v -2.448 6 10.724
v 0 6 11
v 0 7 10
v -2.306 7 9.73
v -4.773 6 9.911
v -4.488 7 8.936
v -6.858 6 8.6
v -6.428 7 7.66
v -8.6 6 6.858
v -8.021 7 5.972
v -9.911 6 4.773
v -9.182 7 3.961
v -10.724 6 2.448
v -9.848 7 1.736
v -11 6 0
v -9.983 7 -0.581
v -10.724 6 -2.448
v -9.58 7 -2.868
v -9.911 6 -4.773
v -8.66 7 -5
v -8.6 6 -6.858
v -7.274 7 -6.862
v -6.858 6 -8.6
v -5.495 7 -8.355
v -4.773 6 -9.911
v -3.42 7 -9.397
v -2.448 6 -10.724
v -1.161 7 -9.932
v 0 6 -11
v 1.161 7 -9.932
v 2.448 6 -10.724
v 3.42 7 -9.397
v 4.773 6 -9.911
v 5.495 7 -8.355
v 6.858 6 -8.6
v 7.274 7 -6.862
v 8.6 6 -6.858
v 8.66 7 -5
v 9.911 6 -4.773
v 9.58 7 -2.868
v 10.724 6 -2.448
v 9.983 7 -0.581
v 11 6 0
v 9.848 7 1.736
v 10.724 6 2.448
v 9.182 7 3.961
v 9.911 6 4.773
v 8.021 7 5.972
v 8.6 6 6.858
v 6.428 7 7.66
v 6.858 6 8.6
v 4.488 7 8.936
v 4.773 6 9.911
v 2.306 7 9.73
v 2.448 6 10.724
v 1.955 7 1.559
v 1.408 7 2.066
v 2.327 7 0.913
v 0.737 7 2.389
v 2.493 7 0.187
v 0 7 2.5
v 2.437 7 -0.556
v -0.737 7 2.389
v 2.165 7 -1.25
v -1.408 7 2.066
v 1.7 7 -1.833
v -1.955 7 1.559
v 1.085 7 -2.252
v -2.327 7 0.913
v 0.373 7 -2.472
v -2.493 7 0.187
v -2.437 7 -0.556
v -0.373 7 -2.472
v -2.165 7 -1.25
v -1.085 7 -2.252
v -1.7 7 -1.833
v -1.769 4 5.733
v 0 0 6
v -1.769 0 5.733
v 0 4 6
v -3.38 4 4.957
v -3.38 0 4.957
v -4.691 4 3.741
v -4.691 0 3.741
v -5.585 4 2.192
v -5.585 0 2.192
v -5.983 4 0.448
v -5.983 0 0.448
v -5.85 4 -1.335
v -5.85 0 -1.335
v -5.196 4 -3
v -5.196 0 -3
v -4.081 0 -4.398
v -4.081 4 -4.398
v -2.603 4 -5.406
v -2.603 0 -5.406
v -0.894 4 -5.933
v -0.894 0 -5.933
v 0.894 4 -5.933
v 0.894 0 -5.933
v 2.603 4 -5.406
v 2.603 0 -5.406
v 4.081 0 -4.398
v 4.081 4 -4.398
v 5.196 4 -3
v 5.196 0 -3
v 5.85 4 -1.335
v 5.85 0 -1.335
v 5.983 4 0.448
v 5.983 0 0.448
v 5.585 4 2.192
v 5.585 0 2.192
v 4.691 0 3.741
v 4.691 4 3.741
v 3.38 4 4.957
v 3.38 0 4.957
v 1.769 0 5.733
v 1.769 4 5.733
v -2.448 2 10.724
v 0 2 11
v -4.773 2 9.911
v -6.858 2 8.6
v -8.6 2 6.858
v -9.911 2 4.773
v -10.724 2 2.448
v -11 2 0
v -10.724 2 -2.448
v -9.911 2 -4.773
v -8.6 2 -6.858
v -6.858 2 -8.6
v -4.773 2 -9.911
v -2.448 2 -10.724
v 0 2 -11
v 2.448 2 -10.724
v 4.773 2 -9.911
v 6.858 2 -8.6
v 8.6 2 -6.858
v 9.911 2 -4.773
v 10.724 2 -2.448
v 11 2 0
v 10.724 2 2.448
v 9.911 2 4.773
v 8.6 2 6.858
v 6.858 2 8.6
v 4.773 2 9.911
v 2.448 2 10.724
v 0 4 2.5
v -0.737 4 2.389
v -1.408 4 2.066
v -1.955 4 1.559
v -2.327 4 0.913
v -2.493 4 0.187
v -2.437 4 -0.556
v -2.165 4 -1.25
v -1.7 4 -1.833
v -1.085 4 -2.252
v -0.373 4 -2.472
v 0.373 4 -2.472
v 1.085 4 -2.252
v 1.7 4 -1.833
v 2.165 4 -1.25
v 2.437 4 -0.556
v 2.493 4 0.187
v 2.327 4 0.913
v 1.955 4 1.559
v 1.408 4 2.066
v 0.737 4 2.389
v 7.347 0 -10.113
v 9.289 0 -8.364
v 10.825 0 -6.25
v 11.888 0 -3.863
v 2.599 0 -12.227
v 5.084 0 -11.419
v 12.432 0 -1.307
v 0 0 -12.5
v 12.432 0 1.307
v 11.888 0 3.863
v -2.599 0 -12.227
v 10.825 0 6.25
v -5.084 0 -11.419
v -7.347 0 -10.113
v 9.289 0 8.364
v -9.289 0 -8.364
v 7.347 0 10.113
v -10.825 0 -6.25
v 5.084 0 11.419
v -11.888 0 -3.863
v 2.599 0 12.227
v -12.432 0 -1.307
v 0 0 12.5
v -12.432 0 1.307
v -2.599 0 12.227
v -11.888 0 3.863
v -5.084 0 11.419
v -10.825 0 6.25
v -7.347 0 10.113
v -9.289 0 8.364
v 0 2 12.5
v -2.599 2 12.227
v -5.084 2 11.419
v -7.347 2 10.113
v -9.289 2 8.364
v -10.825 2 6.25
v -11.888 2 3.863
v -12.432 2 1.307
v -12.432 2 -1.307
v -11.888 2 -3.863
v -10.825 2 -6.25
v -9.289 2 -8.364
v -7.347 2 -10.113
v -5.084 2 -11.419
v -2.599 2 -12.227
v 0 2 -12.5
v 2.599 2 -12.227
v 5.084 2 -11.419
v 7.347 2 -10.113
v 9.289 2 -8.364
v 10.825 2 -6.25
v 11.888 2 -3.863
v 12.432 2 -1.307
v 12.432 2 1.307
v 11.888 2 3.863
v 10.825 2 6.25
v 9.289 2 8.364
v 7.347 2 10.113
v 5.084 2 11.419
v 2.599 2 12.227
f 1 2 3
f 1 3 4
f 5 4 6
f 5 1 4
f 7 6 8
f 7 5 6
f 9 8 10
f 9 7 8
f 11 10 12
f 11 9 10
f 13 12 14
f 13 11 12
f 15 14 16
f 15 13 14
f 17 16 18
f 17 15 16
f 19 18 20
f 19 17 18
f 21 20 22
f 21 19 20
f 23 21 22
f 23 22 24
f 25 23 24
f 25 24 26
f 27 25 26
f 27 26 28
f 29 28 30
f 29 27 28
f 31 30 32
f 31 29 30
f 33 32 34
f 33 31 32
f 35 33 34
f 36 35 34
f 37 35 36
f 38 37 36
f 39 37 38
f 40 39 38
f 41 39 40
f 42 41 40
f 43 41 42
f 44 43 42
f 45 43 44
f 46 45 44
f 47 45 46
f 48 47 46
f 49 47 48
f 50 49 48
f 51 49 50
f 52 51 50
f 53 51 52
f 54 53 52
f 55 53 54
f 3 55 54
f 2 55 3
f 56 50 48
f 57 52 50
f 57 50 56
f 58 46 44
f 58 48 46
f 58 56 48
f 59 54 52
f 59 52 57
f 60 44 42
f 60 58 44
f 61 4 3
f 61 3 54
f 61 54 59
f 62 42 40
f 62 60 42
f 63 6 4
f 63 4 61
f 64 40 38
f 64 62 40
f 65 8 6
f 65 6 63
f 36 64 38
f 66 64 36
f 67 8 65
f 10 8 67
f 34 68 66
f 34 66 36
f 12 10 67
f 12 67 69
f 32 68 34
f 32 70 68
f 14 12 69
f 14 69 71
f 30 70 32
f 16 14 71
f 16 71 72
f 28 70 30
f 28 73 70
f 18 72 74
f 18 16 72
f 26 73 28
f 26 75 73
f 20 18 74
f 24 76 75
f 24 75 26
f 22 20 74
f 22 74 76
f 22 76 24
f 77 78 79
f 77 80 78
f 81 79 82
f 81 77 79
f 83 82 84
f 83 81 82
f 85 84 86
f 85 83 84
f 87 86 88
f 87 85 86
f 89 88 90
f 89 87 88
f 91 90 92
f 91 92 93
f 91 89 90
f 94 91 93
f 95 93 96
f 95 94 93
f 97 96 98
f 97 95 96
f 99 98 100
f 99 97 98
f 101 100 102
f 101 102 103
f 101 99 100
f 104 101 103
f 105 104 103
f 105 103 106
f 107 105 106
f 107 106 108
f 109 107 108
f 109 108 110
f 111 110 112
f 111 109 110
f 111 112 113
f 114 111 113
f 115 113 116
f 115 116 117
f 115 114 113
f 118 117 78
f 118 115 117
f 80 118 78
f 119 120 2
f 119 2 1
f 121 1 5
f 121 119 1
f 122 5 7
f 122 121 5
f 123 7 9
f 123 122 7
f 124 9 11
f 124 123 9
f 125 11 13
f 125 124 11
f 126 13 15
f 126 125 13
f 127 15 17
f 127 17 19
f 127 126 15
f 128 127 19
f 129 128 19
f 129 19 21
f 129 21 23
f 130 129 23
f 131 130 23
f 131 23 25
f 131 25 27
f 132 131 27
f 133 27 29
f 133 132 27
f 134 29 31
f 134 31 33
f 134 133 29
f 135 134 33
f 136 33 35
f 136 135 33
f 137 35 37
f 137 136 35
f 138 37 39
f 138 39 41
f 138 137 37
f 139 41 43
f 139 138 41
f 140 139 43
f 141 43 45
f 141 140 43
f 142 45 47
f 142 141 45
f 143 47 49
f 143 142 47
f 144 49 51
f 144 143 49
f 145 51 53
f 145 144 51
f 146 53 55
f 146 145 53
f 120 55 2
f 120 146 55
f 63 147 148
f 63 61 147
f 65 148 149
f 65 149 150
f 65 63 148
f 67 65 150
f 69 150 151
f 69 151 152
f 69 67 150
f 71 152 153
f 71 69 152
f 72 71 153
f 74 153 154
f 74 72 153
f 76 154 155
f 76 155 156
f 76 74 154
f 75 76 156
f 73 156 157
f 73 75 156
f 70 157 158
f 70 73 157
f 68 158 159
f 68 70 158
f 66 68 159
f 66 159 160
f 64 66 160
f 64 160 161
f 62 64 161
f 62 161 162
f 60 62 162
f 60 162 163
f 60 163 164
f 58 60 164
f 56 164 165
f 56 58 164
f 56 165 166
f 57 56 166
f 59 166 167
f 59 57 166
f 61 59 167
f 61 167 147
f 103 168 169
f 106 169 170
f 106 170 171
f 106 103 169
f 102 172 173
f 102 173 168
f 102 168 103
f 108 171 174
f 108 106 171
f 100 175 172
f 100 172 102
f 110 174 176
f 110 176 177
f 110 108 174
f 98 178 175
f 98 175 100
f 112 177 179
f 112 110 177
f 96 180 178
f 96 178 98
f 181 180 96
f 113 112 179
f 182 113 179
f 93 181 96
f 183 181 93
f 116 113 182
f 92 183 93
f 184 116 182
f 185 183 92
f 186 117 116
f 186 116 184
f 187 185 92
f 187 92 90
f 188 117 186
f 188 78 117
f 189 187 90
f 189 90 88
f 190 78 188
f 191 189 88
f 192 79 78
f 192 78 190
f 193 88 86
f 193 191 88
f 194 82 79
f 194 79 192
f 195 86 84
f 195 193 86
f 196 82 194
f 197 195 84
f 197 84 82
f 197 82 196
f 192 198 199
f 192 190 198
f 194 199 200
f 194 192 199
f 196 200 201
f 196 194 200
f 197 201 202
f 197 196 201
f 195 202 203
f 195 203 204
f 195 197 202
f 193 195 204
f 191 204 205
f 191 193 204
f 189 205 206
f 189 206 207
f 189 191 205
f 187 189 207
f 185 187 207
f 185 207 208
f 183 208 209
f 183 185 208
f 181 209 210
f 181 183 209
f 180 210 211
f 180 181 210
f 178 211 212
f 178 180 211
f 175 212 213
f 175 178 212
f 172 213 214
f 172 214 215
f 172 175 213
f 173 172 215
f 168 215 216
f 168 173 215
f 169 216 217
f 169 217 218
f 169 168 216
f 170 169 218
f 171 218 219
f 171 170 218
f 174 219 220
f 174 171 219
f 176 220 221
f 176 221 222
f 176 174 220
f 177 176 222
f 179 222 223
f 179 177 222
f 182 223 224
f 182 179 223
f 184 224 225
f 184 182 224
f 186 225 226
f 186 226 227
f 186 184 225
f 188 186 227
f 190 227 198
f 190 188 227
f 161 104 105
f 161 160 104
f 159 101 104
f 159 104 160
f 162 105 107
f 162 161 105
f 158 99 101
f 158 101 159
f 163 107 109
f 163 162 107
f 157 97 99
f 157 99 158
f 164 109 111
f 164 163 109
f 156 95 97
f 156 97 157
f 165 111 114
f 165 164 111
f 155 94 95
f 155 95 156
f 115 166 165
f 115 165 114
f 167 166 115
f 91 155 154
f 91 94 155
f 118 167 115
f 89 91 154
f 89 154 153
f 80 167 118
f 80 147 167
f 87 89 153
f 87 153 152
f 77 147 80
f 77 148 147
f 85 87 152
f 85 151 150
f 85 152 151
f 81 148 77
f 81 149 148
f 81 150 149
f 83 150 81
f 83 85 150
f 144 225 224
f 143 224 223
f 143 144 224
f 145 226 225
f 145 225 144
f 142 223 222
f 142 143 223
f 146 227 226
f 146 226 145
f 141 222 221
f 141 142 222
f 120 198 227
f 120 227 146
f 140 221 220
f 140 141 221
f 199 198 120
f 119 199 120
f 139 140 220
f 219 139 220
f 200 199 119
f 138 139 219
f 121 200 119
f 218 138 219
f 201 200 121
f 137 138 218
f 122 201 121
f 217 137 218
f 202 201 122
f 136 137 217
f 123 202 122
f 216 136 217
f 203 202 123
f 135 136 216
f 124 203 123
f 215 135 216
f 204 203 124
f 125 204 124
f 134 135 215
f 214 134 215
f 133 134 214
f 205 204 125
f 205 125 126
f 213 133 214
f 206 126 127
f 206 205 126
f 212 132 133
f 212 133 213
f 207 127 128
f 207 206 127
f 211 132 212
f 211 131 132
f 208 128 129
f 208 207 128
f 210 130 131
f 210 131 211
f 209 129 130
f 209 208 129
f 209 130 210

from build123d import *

# Parameters (mm, degrees)
F2_SIZE = 1


with BuildPart() as f1:
    # F0 (on Right) → F1 (revolve)
    with BuildSketch(Plane.YZ):
        Polygon((0, 6), (4, 6), (4, 2.5), (7, 2.5), (7, 11), (2, 11), (2, 12.5), (0, 12.5), align=None)
    revolve(axis=Axis((0, 5.735075, 0), (0, -1, 0)))

    # F2
    f2_edges = [f1.edges().sort_by_distance(p)[0] for p in [
        (0, 7, -11),
    ]]
    chamfer(f2_edges, length=F2_SIZE)


solid = f1.part
